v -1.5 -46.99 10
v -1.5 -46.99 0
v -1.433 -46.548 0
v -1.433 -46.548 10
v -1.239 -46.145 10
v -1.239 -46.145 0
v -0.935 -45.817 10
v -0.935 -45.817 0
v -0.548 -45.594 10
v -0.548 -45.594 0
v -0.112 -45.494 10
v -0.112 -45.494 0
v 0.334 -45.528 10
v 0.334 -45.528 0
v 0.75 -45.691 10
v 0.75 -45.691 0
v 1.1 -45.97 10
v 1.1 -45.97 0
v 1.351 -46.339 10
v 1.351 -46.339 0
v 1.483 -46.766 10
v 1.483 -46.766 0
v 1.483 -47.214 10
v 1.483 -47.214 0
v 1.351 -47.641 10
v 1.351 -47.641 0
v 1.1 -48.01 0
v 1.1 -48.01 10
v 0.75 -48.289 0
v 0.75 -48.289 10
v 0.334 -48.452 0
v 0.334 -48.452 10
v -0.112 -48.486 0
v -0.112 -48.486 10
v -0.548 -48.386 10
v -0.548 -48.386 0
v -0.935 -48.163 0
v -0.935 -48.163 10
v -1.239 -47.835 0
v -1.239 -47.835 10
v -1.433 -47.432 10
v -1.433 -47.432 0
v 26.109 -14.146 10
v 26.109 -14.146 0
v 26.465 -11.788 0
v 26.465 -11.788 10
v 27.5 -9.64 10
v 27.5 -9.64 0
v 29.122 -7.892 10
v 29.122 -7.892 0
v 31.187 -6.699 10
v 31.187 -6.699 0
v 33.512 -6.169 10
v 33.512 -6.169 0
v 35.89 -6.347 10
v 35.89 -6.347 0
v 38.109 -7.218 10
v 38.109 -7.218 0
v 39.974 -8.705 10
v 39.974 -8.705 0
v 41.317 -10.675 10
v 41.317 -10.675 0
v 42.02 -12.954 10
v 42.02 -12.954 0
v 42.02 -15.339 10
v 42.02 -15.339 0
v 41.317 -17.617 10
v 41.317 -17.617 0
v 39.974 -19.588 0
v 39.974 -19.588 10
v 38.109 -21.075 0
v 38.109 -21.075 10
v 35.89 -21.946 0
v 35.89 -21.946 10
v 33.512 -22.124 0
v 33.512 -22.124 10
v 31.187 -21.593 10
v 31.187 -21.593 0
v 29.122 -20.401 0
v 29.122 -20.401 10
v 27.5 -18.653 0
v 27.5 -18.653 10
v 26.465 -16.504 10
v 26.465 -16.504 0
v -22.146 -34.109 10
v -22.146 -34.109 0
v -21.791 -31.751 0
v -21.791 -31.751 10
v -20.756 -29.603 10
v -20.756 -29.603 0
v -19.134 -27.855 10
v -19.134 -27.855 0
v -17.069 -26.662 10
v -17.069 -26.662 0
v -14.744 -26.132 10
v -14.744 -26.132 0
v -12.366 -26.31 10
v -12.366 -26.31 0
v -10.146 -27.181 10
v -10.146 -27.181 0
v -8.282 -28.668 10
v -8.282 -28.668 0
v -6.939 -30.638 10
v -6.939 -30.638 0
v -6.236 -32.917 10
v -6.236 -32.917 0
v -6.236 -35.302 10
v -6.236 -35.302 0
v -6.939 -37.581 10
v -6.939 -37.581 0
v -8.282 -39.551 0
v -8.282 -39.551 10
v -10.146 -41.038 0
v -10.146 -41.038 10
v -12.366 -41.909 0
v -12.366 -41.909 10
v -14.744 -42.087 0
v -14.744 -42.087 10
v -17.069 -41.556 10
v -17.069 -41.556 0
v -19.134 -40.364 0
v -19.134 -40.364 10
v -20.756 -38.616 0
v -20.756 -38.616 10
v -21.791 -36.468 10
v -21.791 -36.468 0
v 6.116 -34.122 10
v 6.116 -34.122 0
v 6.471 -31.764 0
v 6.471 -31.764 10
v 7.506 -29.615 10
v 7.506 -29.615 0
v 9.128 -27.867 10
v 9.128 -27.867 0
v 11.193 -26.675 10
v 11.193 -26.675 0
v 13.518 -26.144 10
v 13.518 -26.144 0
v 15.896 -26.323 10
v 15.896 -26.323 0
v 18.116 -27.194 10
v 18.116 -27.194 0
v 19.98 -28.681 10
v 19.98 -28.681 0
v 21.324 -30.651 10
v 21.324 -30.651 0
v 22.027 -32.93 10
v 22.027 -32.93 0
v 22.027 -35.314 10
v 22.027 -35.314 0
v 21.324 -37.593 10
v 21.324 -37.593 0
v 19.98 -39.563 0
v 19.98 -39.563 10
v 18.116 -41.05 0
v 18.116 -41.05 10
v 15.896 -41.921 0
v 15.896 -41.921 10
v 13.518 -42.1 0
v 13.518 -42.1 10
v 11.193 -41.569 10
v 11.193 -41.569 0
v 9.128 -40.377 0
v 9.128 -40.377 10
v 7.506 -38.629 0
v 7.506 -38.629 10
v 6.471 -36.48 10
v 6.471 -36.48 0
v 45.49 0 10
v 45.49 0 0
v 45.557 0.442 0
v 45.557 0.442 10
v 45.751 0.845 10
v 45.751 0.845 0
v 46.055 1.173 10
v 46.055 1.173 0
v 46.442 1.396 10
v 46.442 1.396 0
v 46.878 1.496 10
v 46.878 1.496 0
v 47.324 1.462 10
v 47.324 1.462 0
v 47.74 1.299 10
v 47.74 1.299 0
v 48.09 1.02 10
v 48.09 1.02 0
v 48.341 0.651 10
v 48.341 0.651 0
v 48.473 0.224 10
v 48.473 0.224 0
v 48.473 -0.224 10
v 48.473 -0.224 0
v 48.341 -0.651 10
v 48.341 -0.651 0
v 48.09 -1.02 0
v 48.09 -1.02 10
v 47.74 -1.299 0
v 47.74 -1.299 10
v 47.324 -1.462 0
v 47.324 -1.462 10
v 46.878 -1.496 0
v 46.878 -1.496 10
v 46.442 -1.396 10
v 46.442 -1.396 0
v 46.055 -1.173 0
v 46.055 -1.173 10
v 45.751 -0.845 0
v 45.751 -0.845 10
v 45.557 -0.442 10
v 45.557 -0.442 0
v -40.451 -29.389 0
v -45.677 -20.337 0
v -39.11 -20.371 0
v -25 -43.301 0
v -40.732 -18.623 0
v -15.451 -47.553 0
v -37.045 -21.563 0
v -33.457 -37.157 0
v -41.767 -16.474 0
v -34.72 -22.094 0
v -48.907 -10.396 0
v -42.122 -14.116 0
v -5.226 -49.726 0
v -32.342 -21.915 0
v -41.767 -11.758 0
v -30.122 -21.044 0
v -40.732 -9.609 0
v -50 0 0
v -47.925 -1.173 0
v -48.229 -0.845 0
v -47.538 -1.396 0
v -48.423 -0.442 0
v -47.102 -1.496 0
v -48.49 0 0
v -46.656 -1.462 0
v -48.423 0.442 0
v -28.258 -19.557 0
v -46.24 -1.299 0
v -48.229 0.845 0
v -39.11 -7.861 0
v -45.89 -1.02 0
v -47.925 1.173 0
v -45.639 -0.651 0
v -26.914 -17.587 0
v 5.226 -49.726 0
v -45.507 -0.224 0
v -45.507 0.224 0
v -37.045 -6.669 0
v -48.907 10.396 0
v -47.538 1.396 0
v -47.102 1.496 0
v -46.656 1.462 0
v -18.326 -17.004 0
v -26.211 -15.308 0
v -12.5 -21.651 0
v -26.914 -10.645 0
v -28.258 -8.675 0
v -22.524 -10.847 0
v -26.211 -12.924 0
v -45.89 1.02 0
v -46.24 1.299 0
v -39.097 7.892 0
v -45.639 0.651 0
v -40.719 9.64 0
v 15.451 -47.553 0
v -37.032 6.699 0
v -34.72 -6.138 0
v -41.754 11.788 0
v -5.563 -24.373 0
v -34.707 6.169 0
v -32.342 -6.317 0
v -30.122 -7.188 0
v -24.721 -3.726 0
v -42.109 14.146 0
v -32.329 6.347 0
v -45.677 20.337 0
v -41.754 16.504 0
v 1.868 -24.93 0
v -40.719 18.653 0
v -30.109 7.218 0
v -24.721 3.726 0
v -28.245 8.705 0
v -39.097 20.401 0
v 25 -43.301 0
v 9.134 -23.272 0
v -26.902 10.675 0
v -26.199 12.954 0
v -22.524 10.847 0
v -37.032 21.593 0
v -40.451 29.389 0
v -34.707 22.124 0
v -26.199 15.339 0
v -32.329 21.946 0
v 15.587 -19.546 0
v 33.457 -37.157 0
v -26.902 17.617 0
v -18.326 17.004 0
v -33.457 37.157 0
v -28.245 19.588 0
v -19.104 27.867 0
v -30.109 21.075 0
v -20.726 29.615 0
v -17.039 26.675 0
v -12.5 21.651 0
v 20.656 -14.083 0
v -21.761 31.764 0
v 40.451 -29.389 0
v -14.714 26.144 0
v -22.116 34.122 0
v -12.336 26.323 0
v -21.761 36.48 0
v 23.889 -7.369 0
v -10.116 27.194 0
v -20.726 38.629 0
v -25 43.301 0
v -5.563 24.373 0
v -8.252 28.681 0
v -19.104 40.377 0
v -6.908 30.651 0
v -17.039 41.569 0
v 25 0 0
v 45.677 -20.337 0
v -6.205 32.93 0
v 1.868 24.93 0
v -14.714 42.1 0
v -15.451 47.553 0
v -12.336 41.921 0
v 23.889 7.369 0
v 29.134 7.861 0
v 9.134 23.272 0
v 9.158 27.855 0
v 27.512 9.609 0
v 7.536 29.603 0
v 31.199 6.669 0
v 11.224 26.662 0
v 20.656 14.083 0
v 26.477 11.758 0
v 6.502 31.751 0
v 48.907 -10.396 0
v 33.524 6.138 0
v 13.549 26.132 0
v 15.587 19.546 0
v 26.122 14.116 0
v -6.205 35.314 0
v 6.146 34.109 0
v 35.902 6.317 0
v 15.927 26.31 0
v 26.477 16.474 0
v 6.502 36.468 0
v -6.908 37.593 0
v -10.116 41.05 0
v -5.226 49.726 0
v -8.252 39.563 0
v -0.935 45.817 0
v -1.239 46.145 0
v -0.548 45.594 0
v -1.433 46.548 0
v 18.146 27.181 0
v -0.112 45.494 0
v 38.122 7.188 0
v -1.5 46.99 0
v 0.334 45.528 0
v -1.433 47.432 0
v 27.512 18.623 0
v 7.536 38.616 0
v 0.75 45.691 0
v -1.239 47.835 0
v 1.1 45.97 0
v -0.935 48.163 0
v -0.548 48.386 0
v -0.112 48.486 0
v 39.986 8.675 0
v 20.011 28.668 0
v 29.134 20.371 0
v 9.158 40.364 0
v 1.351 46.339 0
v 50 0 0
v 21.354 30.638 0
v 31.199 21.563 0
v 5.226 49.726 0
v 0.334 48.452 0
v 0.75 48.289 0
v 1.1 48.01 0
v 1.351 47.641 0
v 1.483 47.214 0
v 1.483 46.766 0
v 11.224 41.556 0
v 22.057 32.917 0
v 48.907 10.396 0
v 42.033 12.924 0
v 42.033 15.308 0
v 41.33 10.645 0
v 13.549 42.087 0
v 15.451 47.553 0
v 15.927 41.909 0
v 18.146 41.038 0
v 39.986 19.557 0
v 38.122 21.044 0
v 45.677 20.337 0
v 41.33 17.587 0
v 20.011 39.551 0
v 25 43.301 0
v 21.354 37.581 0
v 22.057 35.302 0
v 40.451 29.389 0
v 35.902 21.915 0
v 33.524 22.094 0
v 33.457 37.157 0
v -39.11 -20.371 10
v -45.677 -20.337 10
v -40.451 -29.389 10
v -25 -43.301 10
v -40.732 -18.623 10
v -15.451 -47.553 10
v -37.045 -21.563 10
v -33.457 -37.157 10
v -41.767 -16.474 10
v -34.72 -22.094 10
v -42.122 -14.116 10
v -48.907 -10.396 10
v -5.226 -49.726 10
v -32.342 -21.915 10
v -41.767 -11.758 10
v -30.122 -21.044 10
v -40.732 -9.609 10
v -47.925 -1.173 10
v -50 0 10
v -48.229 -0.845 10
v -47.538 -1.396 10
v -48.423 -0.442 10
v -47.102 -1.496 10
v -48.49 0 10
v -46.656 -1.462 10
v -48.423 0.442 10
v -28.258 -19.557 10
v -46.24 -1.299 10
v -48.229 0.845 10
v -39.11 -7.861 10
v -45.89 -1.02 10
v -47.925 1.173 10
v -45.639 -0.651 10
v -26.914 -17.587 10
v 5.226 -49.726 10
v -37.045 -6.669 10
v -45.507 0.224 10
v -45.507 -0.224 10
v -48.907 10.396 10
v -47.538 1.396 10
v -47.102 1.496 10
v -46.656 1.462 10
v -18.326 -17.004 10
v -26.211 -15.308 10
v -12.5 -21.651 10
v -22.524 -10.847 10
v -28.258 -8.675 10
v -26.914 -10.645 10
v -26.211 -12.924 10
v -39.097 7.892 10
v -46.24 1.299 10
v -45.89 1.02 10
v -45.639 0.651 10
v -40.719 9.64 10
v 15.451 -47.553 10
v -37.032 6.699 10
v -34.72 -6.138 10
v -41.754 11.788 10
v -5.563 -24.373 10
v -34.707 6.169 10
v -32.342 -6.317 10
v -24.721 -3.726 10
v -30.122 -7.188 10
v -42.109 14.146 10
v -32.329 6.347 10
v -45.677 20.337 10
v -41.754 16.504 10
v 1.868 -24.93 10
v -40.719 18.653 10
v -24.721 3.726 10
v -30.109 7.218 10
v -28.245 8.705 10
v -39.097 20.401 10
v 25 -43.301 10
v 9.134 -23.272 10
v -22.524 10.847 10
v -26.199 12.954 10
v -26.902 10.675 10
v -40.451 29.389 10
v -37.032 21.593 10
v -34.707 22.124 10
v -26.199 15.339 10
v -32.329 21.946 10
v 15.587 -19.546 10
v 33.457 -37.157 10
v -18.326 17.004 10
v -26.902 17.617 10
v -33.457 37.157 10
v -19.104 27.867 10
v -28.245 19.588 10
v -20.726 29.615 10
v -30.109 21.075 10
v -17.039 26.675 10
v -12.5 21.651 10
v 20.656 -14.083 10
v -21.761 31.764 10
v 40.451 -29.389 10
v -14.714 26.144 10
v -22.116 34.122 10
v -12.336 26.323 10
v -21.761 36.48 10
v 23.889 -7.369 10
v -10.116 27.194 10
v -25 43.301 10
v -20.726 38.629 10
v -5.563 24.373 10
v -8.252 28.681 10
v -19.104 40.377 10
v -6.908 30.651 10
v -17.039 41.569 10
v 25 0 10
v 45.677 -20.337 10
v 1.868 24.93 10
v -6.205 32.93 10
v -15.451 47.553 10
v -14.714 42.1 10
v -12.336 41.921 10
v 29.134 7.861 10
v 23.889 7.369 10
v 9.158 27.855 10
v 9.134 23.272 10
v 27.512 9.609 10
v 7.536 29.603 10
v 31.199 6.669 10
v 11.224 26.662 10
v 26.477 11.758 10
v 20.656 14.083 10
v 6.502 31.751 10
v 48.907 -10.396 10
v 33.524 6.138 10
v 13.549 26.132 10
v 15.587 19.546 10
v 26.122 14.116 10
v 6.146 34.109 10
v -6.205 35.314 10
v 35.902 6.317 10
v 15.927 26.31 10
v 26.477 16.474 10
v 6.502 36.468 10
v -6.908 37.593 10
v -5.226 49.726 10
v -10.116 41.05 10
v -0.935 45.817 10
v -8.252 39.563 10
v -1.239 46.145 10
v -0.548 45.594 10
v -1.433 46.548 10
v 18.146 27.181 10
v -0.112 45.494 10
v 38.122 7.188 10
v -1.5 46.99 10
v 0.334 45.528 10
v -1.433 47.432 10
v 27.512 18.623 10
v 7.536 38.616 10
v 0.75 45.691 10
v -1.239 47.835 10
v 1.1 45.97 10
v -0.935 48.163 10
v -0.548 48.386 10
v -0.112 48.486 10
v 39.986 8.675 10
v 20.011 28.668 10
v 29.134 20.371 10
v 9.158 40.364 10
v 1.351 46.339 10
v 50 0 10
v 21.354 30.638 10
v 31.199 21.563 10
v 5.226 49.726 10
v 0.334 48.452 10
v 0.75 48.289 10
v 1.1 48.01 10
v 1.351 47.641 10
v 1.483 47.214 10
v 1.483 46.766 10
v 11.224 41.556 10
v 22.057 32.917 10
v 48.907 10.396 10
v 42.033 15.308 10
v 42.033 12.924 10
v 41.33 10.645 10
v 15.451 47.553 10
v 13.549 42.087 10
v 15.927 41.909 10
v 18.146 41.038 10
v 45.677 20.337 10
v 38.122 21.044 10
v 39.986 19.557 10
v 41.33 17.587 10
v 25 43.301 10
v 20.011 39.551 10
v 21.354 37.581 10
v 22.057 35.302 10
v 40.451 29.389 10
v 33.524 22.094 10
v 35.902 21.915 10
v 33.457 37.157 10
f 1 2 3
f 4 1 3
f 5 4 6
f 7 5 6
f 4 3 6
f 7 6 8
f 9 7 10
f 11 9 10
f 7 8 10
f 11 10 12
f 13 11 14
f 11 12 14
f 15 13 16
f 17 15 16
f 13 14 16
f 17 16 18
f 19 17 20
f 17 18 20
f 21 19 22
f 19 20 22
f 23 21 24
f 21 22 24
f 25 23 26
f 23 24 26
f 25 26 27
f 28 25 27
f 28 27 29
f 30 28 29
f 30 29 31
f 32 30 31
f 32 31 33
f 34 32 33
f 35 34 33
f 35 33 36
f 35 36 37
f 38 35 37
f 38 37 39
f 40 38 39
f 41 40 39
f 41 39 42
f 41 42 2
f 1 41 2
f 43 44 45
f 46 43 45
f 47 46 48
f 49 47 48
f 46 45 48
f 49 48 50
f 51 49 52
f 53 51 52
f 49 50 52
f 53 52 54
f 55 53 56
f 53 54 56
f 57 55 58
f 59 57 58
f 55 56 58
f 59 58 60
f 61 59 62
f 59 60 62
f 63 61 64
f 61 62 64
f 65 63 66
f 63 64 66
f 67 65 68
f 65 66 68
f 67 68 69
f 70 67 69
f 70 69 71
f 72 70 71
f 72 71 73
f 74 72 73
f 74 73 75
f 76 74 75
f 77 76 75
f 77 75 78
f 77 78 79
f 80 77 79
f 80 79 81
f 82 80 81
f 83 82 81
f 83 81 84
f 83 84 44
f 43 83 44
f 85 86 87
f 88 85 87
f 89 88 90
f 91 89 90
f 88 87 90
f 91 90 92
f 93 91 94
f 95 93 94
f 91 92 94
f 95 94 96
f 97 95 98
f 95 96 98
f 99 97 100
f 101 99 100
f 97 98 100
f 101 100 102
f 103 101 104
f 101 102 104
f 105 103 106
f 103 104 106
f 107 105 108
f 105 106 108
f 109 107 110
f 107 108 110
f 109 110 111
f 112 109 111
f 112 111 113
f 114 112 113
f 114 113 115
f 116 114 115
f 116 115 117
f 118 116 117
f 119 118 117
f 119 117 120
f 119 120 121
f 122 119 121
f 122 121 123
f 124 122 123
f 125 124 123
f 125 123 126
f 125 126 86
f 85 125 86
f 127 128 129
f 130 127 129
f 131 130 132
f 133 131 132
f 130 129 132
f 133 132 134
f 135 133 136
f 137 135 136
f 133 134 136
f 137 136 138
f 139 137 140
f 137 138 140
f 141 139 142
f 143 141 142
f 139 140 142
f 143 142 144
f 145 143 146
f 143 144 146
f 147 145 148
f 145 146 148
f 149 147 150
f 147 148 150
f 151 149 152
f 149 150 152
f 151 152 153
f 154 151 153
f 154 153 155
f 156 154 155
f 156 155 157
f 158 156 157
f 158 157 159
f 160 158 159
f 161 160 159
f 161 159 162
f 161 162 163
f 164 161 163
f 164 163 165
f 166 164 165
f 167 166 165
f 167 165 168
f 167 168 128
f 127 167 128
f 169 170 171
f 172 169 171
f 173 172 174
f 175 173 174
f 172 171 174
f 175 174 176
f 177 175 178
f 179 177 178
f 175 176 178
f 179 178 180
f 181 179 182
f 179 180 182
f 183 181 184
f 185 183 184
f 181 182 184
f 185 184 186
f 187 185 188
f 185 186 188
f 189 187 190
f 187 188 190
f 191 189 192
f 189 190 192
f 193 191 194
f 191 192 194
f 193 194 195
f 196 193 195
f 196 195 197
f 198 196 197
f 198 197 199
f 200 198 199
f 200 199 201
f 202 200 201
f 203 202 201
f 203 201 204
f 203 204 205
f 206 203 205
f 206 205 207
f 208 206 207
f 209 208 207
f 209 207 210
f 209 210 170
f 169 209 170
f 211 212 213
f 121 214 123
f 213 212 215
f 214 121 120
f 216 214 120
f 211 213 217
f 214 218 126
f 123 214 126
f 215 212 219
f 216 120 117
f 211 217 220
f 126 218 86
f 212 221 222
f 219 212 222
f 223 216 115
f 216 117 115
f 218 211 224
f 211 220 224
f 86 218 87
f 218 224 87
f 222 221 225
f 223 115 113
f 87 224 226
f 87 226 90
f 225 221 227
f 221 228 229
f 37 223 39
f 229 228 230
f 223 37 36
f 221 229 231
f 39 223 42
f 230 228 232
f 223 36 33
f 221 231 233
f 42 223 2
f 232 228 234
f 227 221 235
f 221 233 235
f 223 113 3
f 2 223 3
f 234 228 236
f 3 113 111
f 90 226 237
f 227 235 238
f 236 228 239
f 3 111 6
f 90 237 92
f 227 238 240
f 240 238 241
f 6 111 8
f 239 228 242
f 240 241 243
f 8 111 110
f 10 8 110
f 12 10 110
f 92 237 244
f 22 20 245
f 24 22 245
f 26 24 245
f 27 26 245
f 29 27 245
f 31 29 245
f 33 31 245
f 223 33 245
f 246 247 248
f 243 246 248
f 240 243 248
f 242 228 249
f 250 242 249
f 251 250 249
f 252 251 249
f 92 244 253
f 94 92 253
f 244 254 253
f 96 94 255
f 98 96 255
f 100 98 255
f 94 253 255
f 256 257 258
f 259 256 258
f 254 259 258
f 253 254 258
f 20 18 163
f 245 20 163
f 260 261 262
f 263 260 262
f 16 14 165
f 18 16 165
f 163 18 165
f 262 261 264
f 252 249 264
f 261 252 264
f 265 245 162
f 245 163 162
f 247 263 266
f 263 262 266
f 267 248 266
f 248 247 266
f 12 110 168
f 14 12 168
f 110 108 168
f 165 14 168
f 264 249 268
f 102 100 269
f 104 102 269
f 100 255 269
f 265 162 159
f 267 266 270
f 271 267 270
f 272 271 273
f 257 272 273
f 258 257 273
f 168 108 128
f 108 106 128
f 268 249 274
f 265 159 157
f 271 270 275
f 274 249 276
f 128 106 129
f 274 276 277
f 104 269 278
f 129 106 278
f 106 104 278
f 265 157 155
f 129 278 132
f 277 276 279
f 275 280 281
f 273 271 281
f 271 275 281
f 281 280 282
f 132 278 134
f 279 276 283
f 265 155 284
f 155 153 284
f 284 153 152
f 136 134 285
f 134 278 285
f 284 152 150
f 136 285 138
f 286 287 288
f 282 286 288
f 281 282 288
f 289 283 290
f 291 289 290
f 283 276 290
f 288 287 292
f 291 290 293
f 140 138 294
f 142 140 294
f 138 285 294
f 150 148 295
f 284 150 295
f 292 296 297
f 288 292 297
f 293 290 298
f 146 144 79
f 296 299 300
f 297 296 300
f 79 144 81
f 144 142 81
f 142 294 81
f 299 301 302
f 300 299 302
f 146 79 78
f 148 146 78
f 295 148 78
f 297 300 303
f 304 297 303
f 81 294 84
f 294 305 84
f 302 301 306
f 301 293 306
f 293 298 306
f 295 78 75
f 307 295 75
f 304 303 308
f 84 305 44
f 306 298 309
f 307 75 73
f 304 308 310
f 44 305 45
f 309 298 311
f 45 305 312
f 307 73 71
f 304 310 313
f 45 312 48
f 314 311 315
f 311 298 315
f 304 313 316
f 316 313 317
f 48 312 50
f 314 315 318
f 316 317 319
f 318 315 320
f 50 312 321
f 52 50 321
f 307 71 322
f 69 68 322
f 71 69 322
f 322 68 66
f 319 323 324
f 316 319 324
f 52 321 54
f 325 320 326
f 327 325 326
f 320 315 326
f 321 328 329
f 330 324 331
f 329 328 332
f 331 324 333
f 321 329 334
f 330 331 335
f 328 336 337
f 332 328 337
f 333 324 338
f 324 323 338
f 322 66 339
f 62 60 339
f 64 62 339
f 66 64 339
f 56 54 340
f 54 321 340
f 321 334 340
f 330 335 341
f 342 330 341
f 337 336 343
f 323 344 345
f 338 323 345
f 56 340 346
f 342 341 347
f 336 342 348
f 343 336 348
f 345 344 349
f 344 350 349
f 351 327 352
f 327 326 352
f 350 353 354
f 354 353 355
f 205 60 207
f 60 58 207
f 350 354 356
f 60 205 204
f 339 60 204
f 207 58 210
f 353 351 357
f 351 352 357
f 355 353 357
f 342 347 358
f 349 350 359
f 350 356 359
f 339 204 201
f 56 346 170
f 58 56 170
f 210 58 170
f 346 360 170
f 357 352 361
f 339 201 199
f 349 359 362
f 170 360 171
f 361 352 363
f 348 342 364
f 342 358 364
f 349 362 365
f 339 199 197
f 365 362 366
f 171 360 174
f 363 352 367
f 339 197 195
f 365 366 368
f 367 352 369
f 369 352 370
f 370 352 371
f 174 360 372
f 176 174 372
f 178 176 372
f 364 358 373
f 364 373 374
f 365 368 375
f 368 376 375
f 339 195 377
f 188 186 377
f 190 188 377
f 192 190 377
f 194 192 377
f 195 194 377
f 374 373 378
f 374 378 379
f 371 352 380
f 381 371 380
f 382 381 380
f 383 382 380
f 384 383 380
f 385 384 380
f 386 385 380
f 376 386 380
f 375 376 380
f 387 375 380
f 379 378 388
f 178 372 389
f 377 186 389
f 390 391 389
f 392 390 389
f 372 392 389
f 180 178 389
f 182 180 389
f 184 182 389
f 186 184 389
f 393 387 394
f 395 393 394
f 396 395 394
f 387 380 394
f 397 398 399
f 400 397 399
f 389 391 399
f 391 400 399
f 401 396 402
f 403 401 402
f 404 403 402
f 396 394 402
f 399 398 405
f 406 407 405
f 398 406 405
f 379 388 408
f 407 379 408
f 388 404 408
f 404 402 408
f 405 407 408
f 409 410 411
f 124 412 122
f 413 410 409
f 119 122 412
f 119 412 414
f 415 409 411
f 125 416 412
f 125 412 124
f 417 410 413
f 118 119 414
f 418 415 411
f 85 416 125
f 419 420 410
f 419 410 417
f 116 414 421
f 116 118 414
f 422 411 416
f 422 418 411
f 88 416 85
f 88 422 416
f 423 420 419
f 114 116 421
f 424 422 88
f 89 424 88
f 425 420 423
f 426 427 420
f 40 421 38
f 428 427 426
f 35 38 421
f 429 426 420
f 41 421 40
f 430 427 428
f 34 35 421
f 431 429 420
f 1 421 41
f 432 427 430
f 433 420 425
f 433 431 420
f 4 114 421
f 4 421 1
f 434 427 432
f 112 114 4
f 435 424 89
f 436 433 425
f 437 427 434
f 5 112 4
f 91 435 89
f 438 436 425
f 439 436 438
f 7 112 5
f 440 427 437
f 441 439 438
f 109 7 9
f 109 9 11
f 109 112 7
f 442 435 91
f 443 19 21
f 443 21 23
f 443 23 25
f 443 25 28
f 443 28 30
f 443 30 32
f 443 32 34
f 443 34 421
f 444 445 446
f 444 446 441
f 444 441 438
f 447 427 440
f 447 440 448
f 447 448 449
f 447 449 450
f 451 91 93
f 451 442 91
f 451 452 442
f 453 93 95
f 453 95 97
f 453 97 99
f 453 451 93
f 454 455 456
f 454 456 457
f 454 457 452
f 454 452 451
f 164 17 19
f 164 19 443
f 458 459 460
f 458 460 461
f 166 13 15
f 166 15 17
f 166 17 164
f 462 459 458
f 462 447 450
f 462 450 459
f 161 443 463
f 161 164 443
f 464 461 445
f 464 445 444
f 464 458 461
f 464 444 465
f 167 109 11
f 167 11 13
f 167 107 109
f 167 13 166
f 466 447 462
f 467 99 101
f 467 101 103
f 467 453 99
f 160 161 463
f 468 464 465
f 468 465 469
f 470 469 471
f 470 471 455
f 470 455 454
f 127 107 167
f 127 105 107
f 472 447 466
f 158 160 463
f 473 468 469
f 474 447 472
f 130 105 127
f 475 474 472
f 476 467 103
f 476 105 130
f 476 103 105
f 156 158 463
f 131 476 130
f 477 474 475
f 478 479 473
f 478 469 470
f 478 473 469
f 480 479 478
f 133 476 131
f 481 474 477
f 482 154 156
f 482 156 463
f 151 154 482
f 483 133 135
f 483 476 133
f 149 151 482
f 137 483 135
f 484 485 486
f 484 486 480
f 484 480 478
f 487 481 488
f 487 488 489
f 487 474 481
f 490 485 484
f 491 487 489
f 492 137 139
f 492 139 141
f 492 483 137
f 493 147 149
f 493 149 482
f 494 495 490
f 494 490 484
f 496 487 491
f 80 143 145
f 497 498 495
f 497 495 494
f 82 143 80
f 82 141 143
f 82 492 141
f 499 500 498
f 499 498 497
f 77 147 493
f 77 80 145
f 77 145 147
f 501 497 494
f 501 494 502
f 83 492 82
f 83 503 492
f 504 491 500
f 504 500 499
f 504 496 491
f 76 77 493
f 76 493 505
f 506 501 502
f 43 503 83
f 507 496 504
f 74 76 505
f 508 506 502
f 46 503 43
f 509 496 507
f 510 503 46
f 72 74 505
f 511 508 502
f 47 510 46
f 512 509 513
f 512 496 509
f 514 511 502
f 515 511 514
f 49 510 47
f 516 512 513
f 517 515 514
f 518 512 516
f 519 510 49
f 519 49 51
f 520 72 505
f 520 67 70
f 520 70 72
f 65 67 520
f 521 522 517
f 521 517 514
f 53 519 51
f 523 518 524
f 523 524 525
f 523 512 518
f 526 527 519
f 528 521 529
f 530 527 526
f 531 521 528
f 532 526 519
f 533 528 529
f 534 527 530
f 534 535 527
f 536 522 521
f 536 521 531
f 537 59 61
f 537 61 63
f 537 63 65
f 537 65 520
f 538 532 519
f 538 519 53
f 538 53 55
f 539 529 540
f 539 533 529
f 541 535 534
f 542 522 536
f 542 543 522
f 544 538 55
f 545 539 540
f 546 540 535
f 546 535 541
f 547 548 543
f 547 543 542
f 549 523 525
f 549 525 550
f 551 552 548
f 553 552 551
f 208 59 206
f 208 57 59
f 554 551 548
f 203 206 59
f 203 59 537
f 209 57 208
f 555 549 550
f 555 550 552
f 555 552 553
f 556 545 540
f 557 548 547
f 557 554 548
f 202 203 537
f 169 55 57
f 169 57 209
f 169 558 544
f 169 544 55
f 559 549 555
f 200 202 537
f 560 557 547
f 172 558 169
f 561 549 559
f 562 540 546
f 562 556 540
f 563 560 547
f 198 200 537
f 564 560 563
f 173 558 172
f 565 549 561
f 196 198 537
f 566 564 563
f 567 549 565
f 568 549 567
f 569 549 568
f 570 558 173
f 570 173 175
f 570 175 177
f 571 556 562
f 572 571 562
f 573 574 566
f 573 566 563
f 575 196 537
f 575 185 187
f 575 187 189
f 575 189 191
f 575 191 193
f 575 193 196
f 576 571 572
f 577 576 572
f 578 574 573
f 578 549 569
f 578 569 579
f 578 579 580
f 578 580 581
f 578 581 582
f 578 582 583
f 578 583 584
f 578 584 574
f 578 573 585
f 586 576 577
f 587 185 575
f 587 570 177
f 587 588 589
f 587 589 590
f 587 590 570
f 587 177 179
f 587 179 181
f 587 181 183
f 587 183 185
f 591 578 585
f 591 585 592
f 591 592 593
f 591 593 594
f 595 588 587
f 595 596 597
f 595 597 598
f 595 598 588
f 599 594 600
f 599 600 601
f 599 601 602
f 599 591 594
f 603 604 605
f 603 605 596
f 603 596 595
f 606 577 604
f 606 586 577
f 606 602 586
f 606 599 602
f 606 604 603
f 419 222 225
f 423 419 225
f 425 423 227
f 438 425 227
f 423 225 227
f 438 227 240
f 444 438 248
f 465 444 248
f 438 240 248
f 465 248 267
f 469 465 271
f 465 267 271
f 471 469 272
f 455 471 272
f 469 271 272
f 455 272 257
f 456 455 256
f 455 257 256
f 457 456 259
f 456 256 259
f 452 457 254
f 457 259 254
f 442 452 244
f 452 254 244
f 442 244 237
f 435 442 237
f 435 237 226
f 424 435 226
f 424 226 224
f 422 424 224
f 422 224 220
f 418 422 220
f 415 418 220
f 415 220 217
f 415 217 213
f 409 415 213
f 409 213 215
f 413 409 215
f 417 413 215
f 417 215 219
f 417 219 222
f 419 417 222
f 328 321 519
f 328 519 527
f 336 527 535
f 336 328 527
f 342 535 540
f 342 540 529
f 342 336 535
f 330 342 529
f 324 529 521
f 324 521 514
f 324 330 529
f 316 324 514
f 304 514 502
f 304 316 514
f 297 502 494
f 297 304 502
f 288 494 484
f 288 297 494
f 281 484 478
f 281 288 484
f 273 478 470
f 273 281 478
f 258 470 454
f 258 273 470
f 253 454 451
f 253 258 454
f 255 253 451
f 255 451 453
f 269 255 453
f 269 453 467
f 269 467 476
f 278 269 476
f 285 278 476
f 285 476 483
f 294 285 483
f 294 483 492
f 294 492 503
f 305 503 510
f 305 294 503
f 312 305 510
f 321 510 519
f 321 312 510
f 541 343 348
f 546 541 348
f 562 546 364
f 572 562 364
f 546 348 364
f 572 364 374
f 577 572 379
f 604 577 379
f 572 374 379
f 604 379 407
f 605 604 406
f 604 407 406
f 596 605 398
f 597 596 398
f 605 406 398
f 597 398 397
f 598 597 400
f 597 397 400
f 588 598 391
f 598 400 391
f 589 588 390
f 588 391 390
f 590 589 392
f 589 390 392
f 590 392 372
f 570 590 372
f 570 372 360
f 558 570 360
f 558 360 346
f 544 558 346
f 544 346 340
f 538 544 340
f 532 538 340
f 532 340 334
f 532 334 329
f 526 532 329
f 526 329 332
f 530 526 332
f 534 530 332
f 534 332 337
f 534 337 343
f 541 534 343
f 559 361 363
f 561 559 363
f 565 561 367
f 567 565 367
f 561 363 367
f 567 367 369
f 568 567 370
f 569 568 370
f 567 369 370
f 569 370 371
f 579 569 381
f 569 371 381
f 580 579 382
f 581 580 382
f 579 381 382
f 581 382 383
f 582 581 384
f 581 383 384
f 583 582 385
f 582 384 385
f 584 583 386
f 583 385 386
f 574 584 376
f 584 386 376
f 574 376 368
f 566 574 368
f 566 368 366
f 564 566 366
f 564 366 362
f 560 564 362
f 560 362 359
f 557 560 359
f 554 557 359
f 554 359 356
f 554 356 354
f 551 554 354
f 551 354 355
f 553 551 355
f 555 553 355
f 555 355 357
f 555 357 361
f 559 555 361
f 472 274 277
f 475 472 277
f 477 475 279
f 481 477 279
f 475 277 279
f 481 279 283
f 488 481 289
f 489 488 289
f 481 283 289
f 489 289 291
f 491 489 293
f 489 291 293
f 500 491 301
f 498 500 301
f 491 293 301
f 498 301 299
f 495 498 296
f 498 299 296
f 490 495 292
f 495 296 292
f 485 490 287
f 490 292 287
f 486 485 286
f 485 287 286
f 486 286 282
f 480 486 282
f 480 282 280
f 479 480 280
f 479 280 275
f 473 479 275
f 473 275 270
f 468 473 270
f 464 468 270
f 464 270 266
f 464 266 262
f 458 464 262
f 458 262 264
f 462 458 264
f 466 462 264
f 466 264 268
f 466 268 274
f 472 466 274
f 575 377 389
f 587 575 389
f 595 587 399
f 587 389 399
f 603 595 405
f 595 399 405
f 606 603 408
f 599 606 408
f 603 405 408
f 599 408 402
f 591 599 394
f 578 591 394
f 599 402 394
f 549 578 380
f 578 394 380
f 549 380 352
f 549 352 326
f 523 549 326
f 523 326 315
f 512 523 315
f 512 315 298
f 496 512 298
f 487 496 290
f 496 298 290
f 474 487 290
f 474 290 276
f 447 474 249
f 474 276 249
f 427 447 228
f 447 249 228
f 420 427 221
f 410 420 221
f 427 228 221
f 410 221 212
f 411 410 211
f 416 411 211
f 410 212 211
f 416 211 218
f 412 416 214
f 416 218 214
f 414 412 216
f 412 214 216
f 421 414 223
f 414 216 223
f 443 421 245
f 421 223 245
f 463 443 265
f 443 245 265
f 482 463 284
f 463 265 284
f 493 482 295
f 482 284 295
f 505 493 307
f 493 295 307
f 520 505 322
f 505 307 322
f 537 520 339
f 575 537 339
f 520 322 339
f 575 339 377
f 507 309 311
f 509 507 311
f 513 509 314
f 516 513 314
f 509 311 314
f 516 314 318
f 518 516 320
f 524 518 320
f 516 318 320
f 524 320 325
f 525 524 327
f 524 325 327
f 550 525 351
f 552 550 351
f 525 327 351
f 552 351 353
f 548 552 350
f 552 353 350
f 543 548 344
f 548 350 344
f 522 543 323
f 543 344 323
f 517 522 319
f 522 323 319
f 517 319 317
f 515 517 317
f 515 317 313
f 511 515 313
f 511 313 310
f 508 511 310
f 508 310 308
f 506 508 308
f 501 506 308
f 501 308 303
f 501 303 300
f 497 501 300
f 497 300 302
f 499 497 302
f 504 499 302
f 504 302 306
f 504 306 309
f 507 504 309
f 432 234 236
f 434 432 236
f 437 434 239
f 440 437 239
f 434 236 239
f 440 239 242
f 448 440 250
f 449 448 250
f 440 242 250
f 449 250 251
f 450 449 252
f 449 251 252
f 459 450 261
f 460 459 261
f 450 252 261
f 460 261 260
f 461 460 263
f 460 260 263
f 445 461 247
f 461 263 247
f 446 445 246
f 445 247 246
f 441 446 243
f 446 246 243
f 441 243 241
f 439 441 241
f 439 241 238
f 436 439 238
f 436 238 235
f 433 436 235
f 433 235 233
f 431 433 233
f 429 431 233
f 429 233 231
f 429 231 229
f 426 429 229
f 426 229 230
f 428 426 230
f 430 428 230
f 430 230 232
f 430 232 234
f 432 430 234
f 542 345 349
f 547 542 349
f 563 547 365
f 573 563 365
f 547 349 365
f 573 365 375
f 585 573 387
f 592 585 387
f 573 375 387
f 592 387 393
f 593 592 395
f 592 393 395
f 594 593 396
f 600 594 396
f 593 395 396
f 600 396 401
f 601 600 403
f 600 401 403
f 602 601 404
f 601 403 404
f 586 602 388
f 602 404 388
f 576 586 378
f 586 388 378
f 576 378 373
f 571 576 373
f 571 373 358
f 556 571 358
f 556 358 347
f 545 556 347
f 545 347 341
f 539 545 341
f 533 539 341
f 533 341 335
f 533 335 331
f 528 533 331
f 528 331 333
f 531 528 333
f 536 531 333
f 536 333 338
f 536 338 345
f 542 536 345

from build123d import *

# Parameters (mm, degrees)
SKETCH1_R           = 50
SKETCH1_R_2         = 25
BOSS_EXTRUDE1_DEPTH = 10
SKETCH3_R           = 8
CUT_EXTRUDE1_DEPTH  = 20
SKETCH4_R           = 1.5
CUT_EXTRUDE2_DEPTH  = 30


with BuildPart() as part:
    # Sketch1 → Boss-Extrude1 (new body)
    with BuildSketch(Plane.XY):
        Circle(SKETCH1_R)
        Circle(SKETCH1_R_2, mode=Mode.SUBTRACT)
    extrude(amount=BOSS_EXTRUDE1_DEPTH)

    # Sketch3 → Cut-Extrude1 (cut)
    with BuildSketch(Plane(origin=(0, 0, 0), x_dir=(-1, 0, 0), z_dir=(0, 0, -1))):
        with Locations((-14.146357726, 34.109474384)):
            Circle(SKETCH3_R)
        with Locations((14.116055163, 34.122026117)):
            Circle(SKETCH3_R)
        with Locations((34.109474384, 14.146357726)):
            Circle(SKETCH3_R)
        with Locations((34.122026117, -14.116055163)):
            Circle(SKETCH3_R)
        with Locations((14.146357726, -34.109474384)):
            Circle(SKETCH3_R)
        with Locations((-14.116055163, -34.122026117)):
            Circle(SKETCH3_R)
        with Locations((-34.109474384, -14.146357726)):
            Circle(SKETCH3_R)
        with Locations((-34.122026117, 14.116055163)):
            Circle(SKETCH3_R)
    extrude(amount=-CUT_EXTRUDE1_DEPTH, mode=Mode.SUBTRACT)

    # Sketch4 → Cut-Extrude2 (cut)
    with BuildSketch(Plane(origin=(0, 0, 0), x_dir=(-1, 0, 0), z_dir=(0, 0, -1))):
        with Locations((0, 46.99)):
            Circle(SKETCH4_R)
        with Locations((46.99, 0)):
            Circle(SKETCH4_R)
        with Locations((0, -46.99)):
            Circle(SKETCH4_R)
        with Locations((-46.99, 0)):
            Circle(SKETCH4_R)
    extrude(amount=-CUT_EXTRUDE2_DEPTH, mode=Mode.SUBTRACT)


solid = part.part
